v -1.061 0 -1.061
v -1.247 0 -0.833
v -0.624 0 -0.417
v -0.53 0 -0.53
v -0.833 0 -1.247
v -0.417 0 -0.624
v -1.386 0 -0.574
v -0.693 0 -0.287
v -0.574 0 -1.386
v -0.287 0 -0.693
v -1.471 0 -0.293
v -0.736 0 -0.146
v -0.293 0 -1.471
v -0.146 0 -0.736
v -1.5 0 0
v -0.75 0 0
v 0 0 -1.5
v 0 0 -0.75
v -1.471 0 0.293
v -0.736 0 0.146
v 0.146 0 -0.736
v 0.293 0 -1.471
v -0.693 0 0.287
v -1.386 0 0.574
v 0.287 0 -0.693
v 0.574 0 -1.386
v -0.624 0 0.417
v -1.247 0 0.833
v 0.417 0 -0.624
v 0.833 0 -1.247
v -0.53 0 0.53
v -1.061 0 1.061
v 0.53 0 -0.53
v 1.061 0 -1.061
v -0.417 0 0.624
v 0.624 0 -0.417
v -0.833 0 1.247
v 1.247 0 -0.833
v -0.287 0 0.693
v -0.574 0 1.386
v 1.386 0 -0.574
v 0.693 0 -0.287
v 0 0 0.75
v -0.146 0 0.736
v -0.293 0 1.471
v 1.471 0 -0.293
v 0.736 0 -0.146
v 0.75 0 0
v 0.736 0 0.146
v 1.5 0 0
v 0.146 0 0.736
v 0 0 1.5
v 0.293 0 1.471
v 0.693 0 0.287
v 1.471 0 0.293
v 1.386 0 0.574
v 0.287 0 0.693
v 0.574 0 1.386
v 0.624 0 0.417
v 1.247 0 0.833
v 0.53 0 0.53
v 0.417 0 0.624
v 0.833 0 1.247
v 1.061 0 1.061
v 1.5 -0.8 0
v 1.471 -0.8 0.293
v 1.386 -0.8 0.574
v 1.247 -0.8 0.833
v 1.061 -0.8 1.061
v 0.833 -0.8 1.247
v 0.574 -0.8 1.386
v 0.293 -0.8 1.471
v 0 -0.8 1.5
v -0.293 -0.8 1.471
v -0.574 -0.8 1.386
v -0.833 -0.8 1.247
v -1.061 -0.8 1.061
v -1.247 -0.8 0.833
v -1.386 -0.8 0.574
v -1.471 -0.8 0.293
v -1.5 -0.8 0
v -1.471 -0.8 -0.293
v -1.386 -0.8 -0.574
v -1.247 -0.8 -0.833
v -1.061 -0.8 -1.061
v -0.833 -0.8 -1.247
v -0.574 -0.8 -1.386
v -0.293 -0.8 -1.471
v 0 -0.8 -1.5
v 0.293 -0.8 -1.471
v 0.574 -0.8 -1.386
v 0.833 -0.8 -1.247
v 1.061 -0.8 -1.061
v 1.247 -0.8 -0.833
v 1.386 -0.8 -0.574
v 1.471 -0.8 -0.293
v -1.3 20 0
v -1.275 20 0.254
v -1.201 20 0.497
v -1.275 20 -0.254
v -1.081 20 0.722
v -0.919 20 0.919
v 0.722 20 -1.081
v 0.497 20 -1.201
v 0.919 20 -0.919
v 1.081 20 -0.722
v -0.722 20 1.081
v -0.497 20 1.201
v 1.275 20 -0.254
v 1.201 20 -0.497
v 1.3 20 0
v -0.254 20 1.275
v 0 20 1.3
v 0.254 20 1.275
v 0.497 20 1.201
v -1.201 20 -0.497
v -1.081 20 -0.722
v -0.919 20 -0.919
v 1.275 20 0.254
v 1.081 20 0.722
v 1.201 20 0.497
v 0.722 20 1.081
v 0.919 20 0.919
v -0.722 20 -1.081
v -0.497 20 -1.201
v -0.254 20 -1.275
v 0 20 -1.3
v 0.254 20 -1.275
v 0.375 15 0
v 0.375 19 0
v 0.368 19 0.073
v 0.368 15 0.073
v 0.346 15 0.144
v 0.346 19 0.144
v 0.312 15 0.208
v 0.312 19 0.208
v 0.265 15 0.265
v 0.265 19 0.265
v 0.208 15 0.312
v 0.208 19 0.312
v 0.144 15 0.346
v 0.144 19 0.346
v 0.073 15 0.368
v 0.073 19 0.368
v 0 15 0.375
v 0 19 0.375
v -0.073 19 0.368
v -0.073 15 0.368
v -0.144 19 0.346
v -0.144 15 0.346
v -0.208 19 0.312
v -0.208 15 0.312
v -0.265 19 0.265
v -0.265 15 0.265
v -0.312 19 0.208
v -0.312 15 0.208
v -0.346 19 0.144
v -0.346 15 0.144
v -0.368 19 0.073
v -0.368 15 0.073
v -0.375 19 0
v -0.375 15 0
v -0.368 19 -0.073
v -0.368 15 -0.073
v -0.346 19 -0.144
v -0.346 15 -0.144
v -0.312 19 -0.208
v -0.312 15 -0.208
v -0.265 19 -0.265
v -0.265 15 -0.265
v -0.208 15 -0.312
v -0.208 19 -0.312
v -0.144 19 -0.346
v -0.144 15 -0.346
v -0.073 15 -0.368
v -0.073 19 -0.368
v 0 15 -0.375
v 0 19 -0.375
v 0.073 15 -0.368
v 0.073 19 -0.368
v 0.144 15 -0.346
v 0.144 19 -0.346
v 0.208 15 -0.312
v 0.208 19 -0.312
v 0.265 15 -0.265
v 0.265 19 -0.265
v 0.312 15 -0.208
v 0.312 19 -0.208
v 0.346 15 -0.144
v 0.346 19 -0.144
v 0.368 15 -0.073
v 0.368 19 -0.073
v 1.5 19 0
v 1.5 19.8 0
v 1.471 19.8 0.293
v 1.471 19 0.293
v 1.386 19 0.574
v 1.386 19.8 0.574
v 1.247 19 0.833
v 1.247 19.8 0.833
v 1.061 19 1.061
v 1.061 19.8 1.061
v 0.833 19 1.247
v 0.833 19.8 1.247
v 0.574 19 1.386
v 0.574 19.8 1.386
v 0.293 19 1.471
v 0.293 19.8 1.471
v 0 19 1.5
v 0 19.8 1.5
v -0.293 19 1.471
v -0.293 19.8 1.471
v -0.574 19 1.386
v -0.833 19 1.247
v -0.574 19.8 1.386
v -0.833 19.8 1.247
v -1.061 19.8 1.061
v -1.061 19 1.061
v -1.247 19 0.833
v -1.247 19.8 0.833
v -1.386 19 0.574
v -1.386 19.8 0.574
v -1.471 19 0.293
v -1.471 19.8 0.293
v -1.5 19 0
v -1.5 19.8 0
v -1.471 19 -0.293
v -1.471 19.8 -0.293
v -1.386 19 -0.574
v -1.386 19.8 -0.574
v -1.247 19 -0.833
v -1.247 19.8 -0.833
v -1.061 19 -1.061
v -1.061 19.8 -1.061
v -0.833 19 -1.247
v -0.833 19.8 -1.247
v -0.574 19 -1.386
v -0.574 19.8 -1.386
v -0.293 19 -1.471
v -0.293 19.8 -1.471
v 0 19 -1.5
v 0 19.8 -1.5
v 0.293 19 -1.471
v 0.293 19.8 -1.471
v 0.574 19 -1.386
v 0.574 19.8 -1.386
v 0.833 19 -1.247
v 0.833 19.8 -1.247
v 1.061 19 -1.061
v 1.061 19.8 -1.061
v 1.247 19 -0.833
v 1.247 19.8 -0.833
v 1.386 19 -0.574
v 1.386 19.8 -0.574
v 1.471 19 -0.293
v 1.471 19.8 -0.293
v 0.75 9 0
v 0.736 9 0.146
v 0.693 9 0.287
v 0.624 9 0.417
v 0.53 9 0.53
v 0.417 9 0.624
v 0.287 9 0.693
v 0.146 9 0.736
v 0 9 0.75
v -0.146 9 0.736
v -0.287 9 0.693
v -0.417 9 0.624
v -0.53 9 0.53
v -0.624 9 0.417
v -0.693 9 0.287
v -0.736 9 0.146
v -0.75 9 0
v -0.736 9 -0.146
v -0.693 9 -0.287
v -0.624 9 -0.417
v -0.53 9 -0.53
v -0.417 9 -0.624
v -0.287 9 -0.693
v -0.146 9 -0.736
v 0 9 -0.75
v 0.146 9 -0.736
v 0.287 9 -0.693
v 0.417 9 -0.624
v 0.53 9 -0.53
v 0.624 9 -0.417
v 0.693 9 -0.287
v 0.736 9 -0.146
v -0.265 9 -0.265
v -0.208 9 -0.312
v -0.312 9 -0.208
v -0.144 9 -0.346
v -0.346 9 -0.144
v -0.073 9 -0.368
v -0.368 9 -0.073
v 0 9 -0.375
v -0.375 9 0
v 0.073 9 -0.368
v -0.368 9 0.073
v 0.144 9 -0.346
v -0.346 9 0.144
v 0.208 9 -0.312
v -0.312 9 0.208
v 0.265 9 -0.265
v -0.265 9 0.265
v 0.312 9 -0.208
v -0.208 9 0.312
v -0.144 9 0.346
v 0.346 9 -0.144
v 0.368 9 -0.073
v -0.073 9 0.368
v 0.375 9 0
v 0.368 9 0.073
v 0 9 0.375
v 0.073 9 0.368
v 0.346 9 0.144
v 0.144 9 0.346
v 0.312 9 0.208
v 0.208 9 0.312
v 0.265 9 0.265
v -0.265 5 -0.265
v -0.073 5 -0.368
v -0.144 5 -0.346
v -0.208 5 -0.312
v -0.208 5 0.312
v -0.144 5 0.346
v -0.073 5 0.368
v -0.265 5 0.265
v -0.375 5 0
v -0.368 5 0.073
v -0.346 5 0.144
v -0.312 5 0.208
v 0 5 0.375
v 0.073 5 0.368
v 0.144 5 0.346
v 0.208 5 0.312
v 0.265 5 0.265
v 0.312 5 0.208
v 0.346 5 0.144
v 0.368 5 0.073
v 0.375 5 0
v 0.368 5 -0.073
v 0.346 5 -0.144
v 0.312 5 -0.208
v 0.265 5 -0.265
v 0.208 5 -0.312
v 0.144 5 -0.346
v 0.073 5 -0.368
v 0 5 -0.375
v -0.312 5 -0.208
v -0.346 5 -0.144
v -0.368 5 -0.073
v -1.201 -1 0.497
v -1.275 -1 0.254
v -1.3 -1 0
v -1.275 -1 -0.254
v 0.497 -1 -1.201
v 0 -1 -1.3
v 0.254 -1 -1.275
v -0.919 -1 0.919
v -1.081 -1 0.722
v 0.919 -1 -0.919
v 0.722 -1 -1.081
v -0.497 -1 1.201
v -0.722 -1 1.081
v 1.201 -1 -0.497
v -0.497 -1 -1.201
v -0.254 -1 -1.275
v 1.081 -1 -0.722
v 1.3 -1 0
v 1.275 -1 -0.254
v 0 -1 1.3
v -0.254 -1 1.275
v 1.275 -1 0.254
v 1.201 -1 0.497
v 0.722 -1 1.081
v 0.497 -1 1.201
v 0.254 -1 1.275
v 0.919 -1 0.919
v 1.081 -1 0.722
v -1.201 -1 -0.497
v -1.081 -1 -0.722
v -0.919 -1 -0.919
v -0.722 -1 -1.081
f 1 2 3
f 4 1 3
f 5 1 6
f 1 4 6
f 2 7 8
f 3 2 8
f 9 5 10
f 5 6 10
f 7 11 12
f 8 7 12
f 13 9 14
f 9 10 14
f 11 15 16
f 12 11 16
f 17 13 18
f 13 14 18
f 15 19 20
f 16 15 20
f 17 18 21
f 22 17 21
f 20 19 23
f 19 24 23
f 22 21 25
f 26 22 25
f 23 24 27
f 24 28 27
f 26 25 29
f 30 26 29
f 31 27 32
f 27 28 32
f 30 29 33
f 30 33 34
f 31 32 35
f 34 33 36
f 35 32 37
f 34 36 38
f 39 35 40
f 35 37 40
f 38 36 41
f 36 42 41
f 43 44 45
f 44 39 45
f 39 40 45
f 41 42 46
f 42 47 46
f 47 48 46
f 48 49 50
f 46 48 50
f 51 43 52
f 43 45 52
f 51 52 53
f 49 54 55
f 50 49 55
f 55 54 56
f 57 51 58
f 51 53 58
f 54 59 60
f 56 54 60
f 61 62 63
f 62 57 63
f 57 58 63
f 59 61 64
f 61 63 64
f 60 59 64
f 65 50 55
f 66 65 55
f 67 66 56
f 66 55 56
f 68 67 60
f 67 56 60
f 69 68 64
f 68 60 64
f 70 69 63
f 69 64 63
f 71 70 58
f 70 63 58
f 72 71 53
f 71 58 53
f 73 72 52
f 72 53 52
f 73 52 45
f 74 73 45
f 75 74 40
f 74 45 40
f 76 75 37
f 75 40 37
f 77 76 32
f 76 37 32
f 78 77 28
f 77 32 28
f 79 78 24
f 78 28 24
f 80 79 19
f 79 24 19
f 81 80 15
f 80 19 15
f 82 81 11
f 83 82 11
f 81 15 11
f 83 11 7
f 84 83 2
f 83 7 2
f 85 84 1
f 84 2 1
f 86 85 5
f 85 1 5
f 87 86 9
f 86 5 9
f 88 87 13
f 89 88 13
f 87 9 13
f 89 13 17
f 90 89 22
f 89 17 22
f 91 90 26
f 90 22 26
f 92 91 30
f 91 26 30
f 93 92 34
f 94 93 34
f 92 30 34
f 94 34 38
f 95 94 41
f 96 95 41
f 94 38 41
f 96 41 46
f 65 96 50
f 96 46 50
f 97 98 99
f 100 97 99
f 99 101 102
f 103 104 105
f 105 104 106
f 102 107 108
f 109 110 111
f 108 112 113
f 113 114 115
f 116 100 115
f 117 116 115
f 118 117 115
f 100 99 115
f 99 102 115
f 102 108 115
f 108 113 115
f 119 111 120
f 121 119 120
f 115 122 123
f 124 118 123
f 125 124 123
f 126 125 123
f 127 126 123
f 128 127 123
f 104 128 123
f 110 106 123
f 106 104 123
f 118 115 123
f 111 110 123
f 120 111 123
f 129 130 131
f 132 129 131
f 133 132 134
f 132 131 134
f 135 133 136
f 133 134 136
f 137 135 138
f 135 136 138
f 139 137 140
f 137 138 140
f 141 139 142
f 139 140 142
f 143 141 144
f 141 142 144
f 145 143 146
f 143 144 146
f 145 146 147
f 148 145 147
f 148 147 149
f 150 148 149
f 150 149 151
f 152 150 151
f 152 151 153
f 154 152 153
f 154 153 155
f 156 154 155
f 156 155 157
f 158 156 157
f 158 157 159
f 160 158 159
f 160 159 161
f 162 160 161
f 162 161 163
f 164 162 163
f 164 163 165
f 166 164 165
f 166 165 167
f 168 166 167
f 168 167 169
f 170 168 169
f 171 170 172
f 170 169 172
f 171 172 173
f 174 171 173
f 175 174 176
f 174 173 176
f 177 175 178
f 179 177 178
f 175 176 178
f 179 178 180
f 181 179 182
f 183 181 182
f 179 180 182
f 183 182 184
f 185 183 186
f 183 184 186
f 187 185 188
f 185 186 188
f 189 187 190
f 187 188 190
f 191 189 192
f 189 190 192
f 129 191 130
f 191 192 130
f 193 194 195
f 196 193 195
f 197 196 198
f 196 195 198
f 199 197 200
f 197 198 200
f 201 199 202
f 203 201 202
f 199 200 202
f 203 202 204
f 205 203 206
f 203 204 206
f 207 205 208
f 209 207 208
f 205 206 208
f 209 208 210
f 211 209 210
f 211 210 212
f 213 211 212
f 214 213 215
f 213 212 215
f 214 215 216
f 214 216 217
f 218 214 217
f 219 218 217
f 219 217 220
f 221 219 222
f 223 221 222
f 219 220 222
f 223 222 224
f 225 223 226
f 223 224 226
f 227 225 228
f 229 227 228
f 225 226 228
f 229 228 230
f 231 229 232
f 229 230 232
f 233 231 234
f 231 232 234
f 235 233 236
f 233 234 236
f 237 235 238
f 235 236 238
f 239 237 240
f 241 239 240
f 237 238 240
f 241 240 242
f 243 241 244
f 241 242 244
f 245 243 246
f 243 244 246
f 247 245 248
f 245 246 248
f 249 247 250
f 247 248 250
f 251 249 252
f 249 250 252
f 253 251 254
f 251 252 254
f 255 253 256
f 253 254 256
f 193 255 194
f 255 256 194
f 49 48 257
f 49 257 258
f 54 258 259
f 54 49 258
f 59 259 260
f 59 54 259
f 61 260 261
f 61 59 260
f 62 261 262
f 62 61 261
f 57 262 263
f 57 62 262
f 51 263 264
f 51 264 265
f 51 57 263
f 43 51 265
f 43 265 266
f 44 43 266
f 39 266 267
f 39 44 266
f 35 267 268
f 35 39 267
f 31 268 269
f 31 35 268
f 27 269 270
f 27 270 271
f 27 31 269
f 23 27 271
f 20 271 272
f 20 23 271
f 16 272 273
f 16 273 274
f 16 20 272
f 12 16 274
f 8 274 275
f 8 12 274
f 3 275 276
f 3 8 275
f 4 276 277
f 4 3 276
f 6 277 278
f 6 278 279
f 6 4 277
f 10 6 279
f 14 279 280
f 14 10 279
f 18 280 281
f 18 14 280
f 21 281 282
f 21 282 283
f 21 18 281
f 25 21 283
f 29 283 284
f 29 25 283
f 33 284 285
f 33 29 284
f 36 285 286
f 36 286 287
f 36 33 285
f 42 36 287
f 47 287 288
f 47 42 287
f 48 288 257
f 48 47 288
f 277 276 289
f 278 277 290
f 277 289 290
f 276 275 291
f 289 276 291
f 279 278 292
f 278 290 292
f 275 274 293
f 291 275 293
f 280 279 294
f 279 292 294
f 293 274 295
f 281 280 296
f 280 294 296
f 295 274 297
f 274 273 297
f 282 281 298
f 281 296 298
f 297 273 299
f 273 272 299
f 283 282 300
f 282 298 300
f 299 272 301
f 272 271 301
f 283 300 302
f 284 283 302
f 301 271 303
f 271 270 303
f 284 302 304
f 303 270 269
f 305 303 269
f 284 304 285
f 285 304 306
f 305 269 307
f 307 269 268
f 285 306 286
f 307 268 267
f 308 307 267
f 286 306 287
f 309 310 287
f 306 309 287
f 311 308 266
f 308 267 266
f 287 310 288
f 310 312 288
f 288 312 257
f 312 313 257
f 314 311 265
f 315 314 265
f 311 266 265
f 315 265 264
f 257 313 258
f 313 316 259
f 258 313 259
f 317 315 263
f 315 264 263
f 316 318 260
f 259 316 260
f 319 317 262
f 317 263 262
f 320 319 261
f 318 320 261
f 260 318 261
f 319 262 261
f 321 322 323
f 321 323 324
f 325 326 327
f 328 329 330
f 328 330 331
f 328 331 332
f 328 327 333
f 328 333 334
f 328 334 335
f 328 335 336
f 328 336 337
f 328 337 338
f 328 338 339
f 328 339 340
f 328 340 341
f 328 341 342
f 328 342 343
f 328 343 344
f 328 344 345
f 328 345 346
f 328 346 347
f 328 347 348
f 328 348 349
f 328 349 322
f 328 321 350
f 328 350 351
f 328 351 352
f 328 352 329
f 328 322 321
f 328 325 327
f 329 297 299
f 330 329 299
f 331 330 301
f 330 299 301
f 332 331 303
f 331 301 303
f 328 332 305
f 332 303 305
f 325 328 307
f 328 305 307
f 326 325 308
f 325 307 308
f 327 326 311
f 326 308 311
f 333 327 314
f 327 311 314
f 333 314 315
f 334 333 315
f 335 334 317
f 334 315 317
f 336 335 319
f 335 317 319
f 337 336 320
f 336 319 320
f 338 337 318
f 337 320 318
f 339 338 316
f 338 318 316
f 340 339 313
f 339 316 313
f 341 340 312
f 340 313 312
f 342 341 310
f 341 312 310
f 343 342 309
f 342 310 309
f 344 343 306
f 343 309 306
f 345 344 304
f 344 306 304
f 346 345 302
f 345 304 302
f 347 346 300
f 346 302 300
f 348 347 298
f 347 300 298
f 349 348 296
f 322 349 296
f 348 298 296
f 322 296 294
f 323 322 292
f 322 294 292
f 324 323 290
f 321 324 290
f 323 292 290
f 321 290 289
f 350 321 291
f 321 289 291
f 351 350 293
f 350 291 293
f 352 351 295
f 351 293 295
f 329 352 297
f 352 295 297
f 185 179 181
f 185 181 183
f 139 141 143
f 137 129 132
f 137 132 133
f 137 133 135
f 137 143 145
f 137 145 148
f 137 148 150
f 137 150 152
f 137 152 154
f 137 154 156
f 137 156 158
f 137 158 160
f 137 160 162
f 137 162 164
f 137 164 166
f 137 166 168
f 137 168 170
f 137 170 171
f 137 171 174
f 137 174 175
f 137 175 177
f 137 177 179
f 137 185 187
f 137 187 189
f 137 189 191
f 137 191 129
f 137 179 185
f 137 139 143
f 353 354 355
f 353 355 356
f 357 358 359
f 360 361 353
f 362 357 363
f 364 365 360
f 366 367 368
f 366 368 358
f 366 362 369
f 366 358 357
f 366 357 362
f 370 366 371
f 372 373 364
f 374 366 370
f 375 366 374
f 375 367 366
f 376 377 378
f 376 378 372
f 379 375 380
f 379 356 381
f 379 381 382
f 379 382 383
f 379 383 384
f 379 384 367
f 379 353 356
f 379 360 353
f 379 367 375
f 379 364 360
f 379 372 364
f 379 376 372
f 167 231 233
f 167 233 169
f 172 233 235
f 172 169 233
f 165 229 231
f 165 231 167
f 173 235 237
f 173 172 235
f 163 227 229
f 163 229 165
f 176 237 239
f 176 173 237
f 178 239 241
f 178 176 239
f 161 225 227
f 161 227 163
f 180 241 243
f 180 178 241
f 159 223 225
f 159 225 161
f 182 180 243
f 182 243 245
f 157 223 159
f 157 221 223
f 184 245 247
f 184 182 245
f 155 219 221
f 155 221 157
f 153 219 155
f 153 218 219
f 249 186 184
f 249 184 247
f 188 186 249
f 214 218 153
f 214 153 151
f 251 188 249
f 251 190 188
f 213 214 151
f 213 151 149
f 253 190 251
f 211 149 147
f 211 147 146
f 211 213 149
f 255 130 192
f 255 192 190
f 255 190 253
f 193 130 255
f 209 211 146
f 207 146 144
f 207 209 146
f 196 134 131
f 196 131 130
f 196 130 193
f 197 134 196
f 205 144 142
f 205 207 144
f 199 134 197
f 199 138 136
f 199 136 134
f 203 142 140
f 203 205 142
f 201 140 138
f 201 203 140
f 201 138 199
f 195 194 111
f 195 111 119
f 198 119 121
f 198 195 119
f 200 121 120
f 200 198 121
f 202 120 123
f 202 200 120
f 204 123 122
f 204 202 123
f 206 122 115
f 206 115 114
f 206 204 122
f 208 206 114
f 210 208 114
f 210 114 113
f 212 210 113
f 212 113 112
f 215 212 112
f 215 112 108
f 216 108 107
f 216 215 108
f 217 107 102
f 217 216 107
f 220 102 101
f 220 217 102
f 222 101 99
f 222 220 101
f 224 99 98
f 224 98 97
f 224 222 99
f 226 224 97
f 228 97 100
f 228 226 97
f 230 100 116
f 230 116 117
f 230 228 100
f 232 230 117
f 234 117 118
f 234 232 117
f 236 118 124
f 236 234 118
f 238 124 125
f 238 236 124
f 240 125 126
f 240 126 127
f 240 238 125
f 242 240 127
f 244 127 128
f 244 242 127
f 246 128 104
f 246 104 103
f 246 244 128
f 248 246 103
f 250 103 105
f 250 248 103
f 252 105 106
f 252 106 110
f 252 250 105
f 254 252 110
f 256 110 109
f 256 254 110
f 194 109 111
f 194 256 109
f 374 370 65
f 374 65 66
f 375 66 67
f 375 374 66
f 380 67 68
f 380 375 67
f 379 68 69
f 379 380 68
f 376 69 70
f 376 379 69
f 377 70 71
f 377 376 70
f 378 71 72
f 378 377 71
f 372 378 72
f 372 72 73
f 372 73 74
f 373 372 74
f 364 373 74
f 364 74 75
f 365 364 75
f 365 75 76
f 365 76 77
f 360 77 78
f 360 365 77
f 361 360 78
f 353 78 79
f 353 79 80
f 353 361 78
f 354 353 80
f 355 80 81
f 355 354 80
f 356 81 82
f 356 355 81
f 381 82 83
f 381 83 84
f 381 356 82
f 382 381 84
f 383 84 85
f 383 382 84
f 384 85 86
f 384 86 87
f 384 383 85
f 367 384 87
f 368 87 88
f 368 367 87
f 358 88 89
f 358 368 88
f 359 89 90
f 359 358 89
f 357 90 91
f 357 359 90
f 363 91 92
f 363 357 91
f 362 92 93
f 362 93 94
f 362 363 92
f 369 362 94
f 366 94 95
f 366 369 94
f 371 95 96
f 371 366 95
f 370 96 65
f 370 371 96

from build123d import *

# Parameters (mm, degrees)
F0_R      = 1.5
F0_R_2    = 0.75
F1_DEPTH  = 1
F2_DEPTH  = 9
F3_R      = 0.375
F4_DEPTH  = 4
F6_R      = 1.5
F6_R_2    = 0.375
F7_DEPTH  = 1
F8_DEPTH  = 5
F9_SIZE   = 0.2
F9_2_SIZE = 0.2


with BuildPart() as f1:
    # F0 (on Front) → F1 (new body)
    with BuildSketch(Plane.XZ):
        Circle(F0_R)
        Circle(F0_R_2, mode=Mode.SUBTRACT)
        Circle(F0_R_2)
    extrude(amount=F1_DEPTH)

    # F0 (on Front) → F2 (join)
    with BuildSketch(Plane.XZ):
        Circle(F0_R_2)
    extrude(amount=-F2_DEPTH)

    # F3 (on face) → F4 (cut)
    with BuildSketch(Plane(origin=(0, 9, 0), x_dir=(-1, 0, 0), z_dir=(0, 1, 0))):
        Circle(F3_R)
    extrude(amount=-F4_DEPTH, mode=Mode.SUBTRACT)

    # F9
    f9_edges = [f1.edges().sort_by_distance(p)[0] for p in [
        (-1.5, -1, 0),
    ]]
    chamfer(f9_edges, length=F9_SIZE)


with BuildPart() as f7:
    # F6 (on offset) → F7 (new body)
    with BuildSketch(Plane.XZ.offset(-20)):
        Circle(F6_R)
        Circle(F6_R_2, mode=Mode.SUBTRACT)
        Circle(F6_R_2)
    extrude(amount=F7_DEPTH)

    # F6 (on offset) → F8 (join)
    with BuildSketch(Plane.XZ.offset(-20)):
        Circle(F6_R_2)
    extrude(amount=F8_DEPTH)

    # F9#2
    f9_2_edges = [f7.edges().sort_by_distance(p)[0] for p in [
        (-1.5, 20, 0),
    ]]
    chamfer(f9_2_edges, length=F9_2_SIZE)


solid = Compound([f1.part, f7.part])
